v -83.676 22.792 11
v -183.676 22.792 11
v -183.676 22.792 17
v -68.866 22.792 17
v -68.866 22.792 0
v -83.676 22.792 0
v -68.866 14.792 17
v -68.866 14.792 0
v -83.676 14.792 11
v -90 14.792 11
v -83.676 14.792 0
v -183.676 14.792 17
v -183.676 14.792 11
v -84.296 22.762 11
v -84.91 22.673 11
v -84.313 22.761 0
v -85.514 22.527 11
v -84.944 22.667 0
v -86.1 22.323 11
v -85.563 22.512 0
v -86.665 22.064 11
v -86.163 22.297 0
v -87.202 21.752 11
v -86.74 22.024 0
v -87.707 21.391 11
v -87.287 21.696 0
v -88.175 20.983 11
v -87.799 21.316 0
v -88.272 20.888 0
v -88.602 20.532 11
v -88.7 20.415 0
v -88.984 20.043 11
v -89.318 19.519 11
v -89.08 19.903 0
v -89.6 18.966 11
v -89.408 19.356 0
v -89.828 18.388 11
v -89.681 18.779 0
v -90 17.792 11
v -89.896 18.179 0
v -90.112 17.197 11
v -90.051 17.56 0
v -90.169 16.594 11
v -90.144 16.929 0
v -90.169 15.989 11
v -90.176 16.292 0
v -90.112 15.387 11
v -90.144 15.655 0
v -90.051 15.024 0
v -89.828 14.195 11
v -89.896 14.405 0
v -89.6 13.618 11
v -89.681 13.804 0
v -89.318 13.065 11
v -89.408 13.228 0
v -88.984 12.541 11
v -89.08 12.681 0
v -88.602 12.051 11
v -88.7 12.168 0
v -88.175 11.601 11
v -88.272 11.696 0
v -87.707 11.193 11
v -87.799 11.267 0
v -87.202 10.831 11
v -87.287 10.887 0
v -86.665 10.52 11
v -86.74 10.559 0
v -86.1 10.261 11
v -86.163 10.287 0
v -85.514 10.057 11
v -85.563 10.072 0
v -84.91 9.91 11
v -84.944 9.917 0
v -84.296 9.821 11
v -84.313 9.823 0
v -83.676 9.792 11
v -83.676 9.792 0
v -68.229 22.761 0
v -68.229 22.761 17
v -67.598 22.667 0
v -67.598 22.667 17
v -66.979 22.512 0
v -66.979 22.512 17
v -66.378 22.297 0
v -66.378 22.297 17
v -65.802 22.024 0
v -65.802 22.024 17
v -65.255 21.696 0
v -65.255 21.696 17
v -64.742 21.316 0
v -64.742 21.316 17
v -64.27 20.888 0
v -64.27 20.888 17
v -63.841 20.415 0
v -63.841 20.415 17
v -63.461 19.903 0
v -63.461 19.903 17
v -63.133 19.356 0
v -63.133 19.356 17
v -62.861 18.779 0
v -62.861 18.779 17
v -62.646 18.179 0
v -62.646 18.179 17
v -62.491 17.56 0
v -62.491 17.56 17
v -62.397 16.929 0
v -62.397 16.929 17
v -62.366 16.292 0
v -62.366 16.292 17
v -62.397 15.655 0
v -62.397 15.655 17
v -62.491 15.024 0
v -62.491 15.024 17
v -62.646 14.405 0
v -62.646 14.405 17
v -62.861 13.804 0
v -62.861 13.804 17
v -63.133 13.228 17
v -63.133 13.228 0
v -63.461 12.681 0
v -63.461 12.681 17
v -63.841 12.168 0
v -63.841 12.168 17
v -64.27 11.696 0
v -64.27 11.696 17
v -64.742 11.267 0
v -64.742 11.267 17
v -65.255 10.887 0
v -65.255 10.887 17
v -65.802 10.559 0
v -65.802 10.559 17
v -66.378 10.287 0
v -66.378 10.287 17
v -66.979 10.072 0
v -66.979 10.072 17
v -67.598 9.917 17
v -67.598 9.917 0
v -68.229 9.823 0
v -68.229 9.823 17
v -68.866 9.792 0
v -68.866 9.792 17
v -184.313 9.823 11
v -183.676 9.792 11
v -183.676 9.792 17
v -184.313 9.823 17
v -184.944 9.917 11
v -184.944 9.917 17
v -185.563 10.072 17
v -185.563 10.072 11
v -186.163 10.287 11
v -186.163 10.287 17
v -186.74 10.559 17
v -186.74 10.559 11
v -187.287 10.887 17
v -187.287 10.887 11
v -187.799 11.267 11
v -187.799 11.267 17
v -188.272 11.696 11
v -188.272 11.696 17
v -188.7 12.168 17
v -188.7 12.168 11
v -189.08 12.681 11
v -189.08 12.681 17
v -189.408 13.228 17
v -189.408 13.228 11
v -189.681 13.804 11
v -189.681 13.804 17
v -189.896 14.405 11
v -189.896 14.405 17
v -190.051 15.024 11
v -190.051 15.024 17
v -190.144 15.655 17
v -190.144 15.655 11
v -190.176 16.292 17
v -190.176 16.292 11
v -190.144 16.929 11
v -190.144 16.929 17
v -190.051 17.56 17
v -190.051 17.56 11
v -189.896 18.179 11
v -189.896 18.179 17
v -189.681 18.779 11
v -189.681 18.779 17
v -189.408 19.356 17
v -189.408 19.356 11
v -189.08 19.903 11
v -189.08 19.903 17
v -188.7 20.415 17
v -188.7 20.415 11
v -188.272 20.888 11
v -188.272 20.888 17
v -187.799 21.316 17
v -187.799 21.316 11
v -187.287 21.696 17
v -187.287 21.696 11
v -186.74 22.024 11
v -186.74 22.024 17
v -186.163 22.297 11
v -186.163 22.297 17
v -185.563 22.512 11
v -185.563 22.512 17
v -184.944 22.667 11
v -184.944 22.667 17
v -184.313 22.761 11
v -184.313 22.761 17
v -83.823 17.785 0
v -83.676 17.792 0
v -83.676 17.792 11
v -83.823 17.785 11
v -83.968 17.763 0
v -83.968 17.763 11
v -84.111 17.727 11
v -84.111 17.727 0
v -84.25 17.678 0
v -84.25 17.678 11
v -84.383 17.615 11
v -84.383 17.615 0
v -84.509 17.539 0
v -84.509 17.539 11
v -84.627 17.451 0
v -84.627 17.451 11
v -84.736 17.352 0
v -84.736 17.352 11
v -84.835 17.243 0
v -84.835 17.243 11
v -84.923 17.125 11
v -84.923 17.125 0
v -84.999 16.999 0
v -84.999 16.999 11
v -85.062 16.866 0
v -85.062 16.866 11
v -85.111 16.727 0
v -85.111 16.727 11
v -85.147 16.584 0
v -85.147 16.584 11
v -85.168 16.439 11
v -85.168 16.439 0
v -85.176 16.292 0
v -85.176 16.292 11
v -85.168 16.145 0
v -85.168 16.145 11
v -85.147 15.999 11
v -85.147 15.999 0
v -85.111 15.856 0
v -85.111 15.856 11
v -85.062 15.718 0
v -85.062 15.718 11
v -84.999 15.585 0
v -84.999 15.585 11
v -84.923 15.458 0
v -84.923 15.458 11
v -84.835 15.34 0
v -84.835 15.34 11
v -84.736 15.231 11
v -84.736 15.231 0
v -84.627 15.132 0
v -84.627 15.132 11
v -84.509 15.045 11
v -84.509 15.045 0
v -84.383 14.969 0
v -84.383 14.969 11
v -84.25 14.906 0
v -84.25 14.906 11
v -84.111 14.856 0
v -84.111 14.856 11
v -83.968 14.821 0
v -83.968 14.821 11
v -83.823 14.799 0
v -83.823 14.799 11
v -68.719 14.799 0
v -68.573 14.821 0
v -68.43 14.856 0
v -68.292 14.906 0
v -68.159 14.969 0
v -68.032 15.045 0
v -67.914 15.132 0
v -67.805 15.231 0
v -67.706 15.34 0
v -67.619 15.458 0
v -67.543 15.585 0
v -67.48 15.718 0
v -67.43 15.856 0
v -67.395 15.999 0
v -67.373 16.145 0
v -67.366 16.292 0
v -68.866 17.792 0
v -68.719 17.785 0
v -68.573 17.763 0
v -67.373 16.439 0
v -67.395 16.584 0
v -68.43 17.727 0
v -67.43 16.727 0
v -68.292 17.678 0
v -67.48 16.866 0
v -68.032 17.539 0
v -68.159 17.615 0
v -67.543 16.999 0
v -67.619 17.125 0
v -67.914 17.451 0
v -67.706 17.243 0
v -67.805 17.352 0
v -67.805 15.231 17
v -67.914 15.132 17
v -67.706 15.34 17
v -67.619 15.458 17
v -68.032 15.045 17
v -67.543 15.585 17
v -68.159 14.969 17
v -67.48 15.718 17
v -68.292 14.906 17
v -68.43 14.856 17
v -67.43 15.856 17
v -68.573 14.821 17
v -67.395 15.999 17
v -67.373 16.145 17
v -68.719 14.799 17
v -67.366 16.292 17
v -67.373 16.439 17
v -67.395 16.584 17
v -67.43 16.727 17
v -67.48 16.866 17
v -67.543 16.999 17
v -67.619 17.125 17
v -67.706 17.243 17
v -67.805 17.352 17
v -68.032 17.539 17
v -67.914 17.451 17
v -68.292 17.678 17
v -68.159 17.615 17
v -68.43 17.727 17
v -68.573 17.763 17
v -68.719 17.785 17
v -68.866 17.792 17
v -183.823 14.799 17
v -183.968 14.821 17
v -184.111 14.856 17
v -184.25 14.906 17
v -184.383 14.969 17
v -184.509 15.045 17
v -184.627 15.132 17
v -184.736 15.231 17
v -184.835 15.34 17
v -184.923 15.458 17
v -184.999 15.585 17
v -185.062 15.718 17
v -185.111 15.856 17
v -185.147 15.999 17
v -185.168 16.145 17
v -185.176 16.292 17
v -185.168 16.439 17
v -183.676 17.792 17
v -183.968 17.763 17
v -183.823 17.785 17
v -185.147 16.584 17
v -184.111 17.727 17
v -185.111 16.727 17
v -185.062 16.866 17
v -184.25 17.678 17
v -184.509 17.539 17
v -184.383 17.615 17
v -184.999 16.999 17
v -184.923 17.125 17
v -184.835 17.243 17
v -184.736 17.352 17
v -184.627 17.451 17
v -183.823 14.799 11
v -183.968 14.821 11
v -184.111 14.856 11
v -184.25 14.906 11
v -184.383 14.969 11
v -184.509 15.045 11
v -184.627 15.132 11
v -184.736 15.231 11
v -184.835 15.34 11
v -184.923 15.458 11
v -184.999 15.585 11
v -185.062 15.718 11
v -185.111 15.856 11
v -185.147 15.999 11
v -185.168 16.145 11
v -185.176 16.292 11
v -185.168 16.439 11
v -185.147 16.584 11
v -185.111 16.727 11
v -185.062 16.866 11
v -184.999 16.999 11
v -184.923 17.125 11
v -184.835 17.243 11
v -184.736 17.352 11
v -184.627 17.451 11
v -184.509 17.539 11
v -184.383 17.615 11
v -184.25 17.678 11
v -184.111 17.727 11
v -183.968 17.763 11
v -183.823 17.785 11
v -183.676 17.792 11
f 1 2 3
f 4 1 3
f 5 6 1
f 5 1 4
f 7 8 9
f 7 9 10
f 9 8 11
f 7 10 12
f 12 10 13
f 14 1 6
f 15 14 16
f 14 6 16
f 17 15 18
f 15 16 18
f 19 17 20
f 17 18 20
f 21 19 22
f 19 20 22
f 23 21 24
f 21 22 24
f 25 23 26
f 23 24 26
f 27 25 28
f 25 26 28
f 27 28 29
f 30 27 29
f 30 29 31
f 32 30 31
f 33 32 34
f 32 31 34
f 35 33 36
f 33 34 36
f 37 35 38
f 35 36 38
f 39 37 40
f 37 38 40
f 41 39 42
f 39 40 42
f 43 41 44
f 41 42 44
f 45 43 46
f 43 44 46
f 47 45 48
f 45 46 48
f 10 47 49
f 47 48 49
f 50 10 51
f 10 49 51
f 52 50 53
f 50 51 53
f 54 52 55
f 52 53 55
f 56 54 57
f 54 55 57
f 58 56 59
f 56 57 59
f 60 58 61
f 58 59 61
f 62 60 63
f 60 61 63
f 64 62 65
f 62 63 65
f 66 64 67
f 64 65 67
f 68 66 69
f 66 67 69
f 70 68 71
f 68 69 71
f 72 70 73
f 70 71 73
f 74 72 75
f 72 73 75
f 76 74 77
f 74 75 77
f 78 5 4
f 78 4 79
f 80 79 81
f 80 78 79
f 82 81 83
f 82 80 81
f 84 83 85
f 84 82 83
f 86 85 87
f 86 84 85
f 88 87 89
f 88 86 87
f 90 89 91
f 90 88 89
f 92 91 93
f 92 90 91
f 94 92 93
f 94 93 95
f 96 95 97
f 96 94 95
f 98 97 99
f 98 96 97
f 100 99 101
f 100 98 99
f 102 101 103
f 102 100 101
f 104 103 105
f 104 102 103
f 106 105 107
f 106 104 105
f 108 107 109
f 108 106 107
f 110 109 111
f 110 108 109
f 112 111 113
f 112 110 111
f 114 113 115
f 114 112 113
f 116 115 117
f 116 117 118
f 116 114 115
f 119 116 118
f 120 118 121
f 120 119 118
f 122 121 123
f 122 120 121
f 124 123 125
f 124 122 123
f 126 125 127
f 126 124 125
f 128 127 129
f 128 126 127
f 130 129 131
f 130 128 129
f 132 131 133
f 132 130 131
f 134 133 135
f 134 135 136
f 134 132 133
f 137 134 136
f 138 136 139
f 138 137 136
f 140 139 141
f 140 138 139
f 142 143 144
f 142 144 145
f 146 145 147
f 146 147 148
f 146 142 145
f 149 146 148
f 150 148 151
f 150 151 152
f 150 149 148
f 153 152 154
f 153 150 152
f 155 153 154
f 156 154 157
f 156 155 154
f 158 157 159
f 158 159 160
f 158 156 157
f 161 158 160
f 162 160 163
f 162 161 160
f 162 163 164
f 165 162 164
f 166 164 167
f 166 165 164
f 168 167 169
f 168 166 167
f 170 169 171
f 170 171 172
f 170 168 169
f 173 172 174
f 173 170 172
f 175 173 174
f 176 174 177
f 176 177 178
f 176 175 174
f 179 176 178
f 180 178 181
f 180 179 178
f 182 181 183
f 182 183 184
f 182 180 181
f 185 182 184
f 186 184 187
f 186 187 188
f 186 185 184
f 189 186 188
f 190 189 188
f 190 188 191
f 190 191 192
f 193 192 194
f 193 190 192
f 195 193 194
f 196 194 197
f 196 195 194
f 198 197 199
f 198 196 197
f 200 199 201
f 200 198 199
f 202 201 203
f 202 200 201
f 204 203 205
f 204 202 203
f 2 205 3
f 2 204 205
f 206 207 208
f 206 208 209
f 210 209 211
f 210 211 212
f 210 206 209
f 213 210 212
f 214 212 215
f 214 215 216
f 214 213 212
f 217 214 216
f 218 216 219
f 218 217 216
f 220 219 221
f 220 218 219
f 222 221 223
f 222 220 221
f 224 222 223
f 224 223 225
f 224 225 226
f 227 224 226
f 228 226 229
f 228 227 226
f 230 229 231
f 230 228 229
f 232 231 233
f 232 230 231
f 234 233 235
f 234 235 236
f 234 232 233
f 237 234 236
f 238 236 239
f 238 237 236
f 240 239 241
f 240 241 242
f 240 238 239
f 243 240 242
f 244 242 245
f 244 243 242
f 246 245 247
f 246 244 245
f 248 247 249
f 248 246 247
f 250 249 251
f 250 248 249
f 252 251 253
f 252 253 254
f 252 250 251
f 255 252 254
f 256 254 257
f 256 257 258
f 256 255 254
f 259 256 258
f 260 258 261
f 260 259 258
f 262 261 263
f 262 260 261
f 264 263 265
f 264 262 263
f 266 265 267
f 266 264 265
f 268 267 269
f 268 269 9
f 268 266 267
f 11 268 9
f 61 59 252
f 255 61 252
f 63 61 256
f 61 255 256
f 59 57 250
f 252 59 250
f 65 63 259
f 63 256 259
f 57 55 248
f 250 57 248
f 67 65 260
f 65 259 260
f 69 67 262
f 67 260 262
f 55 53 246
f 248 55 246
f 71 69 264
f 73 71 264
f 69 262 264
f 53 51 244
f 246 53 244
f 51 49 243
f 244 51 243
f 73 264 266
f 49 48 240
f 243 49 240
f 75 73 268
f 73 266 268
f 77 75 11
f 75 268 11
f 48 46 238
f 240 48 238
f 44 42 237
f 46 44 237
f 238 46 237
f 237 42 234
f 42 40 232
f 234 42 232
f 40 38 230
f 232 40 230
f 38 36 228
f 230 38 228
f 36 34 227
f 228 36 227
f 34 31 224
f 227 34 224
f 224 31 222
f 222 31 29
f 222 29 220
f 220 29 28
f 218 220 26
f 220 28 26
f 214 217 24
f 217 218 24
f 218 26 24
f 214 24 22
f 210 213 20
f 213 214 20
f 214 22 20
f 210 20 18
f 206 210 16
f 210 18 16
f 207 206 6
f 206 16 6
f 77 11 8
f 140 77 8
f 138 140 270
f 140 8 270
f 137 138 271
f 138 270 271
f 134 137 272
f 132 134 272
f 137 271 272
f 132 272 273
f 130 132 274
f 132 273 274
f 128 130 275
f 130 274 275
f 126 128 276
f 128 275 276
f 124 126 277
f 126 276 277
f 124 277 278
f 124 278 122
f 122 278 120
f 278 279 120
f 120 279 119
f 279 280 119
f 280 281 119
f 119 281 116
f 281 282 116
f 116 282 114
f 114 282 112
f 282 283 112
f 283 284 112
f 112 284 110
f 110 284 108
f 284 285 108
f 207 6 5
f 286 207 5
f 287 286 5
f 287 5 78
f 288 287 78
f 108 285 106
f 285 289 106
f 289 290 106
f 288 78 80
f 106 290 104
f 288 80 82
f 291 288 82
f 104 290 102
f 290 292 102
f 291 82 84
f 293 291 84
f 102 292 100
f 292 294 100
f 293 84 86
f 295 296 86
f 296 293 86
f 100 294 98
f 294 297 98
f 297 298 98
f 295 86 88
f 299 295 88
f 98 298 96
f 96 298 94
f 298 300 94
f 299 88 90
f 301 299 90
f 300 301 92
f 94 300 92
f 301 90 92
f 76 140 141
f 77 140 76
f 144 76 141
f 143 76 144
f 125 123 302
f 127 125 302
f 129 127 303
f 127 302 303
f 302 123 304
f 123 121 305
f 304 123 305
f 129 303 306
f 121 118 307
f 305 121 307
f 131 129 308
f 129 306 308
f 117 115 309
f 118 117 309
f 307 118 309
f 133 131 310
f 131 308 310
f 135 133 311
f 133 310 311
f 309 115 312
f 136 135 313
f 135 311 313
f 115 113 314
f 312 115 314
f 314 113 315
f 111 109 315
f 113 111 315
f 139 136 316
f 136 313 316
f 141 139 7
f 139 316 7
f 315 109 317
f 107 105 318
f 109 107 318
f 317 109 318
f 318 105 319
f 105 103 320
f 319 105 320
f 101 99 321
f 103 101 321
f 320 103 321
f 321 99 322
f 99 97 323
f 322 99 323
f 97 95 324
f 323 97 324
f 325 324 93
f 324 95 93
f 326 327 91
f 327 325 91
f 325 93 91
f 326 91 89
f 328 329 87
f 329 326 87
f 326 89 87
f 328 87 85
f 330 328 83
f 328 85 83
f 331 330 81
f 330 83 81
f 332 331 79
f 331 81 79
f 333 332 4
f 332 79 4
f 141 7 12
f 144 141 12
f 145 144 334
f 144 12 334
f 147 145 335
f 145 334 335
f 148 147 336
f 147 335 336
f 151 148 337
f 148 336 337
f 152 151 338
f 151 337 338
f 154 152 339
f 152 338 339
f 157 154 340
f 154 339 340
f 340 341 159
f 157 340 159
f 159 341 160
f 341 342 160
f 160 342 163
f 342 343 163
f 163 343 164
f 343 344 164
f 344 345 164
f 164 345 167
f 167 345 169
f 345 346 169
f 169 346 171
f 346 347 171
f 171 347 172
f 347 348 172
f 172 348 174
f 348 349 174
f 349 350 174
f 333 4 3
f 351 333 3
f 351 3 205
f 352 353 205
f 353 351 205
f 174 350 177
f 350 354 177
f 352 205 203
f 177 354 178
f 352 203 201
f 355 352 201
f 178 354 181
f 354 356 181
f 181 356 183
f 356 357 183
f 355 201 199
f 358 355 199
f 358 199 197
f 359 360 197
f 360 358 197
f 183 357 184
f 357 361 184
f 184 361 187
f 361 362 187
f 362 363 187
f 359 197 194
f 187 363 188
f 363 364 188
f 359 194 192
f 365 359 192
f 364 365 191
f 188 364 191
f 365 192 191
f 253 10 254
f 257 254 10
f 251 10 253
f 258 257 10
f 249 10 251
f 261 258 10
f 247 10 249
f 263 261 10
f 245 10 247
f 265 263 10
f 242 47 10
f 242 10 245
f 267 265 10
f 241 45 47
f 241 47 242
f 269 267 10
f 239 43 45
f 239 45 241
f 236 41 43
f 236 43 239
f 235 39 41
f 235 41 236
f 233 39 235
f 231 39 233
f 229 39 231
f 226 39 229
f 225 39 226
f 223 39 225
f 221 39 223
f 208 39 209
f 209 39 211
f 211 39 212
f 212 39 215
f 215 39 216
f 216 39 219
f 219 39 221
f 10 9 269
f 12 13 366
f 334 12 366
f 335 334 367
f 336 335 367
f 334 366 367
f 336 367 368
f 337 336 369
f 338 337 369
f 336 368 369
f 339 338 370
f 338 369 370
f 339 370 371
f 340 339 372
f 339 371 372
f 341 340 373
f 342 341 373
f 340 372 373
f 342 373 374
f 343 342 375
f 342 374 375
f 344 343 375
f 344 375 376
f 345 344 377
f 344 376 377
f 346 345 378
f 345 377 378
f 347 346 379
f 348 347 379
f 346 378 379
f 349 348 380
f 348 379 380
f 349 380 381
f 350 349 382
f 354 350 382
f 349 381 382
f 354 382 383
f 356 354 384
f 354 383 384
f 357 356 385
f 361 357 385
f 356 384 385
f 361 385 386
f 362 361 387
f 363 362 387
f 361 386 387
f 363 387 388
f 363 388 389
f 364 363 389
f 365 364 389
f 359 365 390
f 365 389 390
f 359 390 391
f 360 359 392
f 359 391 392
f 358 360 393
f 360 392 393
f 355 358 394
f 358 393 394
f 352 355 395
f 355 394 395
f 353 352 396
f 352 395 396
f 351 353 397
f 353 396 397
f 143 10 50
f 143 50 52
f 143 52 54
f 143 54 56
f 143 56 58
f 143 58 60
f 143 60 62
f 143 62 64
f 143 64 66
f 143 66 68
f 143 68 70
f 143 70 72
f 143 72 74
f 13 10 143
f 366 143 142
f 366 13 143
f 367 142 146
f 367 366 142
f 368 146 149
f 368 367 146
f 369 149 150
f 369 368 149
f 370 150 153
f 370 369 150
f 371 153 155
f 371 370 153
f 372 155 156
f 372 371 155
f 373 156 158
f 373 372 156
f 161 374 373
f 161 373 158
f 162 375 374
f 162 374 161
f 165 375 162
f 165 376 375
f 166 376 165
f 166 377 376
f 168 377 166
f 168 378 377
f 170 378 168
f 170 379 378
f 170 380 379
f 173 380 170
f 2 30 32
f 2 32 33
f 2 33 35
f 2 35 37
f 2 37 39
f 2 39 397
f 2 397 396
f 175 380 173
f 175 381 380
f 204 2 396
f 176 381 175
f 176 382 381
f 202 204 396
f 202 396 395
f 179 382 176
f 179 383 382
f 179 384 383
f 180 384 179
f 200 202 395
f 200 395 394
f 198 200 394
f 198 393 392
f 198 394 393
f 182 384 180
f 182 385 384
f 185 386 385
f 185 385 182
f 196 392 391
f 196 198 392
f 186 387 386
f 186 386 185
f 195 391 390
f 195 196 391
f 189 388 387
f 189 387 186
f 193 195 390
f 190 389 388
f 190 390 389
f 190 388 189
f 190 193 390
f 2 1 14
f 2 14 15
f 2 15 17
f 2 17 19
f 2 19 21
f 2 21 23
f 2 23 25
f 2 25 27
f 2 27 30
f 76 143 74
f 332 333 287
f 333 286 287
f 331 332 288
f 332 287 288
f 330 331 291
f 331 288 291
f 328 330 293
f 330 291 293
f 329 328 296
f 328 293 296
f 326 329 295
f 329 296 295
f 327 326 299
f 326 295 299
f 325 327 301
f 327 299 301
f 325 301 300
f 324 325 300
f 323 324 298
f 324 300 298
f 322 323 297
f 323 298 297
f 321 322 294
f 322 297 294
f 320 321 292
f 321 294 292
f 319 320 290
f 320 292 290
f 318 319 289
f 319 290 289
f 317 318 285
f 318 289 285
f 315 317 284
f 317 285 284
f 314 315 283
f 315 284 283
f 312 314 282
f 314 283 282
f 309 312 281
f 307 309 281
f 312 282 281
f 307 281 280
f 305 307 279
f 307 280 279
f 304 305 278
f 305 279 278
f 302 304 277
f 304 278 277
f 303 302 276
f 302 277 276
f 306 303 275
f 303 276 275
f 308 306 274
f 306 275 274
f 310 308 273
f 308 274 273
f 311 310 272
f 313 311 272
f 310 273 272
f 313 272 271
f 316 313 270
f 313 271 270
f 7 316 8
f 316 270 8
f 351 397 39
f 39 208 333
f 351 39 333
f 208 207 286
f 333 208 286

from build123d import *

# Parameters (mm, degrees)
BOSS_EXTRUDE1_DEPTH = 11
BOSS_EXTRUDE2_DEPTH = 6


with BuildPart() as part:
    # Sketch1 → Boss-Extrude1 (new body)
    with BuildSketch(Plane.XY):
        with BuildLine():
            Line((-68.865823893, 22.791817364), (-83.675684171, 22.791817364))
            ThreePointArc((-83.675684171, 22.791817364), (-90.175684171, 16.291817364), (-83.675684171, 9.791817364))
            Line((-83.675684171, 9.791817364), (-68.865823893, 9.791817364))
            ThreePointArc((-68.865823893, 9.791817364), (-62.365823893, 16.291817364), (-68.865823893, 22.791817364))
        make_face()
        with BuildLine():
            Line((-68.865823893, 17.791817364), (-83.675684171, 17.791817364))
            ThreePointArc((-83.675684171, 17.791817364), (-85.175684171, 16.291817364), (-83.675684171, 14.791817364))
            Line((-83.675684171, 14.791817364), (-68.865823893, 14.791817364))
            ThreePointArc((-68.865823893, 14.791817364), (-67.365823893, 16.291817364), (-68.865823893, 17.791817364))
        make_face(mode=Mode.SUBTRACT)
    extrude(amount=BOSS_EXTRUDE1_DEPTH)

    # Sketch2 → Boss-Extrude2 (add)
    with BuildSketch(Plane.XY.offset(11)):
        with BuildLine():
            Line((-183.675684171, 22.791817364), (-83.675684171, 22.791817364))
            Line((-83.675684171, 22.791817364), (-68.865823893, 22.791817364))
            ThreePointArc((-68.865823893, 22.791817364), (-62.365823893, 16.291817364), (-68.865823893, 9.791817364))
            Line((-68.865823893, 9.791817364), (-83.675684171, 9.791817364))
            Line((-83.675684171, 9.791817364), (-183.675684171, 9.791817364))
            ThreePointArc((-183.675684171, 9.791817364), (-190.175684171, 16.291817364), (-183.675684171, 22.791817364))
        make_face()
        with BuildLine():
            Line((-183.675684171, 17.791817364), (-83.675684171, 17.791817364))
            Line((-83.675684171, 17.791817364), (-68.865823893, 17.791817364))
            ThreePointArc((-68.865823893, 17.791817364), (-67.365823893, 16.291817364), (-68.865823893, 14.791817364))
            Line((-68.865823893, 14.791817364), (-83.675684171, 14.791817364))
            Line((-83.675684171, 14.791817364), (-183.675684171, 14.791817364))
            ThreePointArc((-183.675684171, 14.791817364), (-185.175684171, 16.291817364), (-183.675684171, 17.791817364))
        make_face(mode=Mode.SUBTRACT)
    extrude(amount=BOSS_EXTRUDE2_DEPTH)


solid = part.part
